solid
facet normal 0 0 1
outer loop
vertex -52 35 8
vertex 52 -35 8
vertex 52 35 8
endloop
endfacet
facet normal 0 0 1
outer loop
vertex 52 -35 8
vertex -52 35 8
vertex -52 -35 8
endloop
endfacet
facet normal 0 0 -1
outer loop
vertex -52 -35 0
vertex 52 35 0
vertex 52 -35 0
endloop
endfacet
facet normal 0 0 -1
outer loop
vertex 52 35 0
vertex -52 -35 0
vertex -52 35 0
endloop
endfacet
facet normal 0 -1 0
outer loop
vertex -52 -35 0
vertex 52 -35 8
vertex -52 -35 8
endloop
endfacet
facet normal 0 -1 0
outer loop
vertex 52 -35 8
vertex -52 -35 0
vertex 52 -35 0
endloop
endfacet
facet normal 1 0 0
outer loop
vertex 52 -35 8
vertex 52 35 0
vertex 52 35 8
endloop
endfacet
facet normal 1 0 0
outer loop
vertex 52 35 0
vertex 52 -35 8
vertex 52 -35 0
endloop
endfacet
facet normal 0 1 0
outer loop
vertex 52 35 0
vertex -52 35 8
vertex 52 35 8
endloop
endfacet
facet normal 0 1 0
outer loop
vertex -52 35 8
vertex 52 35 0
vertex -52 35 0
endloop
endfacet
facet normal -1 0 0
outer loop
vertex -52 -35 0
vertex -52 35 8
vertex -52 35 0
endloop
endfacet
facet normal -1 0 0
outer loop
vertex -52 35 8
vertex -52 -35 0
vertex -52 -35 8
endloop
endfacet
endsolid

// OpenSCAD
// Generated with SolidPython2 for OpenSCAD task-036
$fn = 64;

union() {
	translate(v = [-52.0, -35.0, 0]) {
		cube(size = [104, 70, 8]);
	}
}
